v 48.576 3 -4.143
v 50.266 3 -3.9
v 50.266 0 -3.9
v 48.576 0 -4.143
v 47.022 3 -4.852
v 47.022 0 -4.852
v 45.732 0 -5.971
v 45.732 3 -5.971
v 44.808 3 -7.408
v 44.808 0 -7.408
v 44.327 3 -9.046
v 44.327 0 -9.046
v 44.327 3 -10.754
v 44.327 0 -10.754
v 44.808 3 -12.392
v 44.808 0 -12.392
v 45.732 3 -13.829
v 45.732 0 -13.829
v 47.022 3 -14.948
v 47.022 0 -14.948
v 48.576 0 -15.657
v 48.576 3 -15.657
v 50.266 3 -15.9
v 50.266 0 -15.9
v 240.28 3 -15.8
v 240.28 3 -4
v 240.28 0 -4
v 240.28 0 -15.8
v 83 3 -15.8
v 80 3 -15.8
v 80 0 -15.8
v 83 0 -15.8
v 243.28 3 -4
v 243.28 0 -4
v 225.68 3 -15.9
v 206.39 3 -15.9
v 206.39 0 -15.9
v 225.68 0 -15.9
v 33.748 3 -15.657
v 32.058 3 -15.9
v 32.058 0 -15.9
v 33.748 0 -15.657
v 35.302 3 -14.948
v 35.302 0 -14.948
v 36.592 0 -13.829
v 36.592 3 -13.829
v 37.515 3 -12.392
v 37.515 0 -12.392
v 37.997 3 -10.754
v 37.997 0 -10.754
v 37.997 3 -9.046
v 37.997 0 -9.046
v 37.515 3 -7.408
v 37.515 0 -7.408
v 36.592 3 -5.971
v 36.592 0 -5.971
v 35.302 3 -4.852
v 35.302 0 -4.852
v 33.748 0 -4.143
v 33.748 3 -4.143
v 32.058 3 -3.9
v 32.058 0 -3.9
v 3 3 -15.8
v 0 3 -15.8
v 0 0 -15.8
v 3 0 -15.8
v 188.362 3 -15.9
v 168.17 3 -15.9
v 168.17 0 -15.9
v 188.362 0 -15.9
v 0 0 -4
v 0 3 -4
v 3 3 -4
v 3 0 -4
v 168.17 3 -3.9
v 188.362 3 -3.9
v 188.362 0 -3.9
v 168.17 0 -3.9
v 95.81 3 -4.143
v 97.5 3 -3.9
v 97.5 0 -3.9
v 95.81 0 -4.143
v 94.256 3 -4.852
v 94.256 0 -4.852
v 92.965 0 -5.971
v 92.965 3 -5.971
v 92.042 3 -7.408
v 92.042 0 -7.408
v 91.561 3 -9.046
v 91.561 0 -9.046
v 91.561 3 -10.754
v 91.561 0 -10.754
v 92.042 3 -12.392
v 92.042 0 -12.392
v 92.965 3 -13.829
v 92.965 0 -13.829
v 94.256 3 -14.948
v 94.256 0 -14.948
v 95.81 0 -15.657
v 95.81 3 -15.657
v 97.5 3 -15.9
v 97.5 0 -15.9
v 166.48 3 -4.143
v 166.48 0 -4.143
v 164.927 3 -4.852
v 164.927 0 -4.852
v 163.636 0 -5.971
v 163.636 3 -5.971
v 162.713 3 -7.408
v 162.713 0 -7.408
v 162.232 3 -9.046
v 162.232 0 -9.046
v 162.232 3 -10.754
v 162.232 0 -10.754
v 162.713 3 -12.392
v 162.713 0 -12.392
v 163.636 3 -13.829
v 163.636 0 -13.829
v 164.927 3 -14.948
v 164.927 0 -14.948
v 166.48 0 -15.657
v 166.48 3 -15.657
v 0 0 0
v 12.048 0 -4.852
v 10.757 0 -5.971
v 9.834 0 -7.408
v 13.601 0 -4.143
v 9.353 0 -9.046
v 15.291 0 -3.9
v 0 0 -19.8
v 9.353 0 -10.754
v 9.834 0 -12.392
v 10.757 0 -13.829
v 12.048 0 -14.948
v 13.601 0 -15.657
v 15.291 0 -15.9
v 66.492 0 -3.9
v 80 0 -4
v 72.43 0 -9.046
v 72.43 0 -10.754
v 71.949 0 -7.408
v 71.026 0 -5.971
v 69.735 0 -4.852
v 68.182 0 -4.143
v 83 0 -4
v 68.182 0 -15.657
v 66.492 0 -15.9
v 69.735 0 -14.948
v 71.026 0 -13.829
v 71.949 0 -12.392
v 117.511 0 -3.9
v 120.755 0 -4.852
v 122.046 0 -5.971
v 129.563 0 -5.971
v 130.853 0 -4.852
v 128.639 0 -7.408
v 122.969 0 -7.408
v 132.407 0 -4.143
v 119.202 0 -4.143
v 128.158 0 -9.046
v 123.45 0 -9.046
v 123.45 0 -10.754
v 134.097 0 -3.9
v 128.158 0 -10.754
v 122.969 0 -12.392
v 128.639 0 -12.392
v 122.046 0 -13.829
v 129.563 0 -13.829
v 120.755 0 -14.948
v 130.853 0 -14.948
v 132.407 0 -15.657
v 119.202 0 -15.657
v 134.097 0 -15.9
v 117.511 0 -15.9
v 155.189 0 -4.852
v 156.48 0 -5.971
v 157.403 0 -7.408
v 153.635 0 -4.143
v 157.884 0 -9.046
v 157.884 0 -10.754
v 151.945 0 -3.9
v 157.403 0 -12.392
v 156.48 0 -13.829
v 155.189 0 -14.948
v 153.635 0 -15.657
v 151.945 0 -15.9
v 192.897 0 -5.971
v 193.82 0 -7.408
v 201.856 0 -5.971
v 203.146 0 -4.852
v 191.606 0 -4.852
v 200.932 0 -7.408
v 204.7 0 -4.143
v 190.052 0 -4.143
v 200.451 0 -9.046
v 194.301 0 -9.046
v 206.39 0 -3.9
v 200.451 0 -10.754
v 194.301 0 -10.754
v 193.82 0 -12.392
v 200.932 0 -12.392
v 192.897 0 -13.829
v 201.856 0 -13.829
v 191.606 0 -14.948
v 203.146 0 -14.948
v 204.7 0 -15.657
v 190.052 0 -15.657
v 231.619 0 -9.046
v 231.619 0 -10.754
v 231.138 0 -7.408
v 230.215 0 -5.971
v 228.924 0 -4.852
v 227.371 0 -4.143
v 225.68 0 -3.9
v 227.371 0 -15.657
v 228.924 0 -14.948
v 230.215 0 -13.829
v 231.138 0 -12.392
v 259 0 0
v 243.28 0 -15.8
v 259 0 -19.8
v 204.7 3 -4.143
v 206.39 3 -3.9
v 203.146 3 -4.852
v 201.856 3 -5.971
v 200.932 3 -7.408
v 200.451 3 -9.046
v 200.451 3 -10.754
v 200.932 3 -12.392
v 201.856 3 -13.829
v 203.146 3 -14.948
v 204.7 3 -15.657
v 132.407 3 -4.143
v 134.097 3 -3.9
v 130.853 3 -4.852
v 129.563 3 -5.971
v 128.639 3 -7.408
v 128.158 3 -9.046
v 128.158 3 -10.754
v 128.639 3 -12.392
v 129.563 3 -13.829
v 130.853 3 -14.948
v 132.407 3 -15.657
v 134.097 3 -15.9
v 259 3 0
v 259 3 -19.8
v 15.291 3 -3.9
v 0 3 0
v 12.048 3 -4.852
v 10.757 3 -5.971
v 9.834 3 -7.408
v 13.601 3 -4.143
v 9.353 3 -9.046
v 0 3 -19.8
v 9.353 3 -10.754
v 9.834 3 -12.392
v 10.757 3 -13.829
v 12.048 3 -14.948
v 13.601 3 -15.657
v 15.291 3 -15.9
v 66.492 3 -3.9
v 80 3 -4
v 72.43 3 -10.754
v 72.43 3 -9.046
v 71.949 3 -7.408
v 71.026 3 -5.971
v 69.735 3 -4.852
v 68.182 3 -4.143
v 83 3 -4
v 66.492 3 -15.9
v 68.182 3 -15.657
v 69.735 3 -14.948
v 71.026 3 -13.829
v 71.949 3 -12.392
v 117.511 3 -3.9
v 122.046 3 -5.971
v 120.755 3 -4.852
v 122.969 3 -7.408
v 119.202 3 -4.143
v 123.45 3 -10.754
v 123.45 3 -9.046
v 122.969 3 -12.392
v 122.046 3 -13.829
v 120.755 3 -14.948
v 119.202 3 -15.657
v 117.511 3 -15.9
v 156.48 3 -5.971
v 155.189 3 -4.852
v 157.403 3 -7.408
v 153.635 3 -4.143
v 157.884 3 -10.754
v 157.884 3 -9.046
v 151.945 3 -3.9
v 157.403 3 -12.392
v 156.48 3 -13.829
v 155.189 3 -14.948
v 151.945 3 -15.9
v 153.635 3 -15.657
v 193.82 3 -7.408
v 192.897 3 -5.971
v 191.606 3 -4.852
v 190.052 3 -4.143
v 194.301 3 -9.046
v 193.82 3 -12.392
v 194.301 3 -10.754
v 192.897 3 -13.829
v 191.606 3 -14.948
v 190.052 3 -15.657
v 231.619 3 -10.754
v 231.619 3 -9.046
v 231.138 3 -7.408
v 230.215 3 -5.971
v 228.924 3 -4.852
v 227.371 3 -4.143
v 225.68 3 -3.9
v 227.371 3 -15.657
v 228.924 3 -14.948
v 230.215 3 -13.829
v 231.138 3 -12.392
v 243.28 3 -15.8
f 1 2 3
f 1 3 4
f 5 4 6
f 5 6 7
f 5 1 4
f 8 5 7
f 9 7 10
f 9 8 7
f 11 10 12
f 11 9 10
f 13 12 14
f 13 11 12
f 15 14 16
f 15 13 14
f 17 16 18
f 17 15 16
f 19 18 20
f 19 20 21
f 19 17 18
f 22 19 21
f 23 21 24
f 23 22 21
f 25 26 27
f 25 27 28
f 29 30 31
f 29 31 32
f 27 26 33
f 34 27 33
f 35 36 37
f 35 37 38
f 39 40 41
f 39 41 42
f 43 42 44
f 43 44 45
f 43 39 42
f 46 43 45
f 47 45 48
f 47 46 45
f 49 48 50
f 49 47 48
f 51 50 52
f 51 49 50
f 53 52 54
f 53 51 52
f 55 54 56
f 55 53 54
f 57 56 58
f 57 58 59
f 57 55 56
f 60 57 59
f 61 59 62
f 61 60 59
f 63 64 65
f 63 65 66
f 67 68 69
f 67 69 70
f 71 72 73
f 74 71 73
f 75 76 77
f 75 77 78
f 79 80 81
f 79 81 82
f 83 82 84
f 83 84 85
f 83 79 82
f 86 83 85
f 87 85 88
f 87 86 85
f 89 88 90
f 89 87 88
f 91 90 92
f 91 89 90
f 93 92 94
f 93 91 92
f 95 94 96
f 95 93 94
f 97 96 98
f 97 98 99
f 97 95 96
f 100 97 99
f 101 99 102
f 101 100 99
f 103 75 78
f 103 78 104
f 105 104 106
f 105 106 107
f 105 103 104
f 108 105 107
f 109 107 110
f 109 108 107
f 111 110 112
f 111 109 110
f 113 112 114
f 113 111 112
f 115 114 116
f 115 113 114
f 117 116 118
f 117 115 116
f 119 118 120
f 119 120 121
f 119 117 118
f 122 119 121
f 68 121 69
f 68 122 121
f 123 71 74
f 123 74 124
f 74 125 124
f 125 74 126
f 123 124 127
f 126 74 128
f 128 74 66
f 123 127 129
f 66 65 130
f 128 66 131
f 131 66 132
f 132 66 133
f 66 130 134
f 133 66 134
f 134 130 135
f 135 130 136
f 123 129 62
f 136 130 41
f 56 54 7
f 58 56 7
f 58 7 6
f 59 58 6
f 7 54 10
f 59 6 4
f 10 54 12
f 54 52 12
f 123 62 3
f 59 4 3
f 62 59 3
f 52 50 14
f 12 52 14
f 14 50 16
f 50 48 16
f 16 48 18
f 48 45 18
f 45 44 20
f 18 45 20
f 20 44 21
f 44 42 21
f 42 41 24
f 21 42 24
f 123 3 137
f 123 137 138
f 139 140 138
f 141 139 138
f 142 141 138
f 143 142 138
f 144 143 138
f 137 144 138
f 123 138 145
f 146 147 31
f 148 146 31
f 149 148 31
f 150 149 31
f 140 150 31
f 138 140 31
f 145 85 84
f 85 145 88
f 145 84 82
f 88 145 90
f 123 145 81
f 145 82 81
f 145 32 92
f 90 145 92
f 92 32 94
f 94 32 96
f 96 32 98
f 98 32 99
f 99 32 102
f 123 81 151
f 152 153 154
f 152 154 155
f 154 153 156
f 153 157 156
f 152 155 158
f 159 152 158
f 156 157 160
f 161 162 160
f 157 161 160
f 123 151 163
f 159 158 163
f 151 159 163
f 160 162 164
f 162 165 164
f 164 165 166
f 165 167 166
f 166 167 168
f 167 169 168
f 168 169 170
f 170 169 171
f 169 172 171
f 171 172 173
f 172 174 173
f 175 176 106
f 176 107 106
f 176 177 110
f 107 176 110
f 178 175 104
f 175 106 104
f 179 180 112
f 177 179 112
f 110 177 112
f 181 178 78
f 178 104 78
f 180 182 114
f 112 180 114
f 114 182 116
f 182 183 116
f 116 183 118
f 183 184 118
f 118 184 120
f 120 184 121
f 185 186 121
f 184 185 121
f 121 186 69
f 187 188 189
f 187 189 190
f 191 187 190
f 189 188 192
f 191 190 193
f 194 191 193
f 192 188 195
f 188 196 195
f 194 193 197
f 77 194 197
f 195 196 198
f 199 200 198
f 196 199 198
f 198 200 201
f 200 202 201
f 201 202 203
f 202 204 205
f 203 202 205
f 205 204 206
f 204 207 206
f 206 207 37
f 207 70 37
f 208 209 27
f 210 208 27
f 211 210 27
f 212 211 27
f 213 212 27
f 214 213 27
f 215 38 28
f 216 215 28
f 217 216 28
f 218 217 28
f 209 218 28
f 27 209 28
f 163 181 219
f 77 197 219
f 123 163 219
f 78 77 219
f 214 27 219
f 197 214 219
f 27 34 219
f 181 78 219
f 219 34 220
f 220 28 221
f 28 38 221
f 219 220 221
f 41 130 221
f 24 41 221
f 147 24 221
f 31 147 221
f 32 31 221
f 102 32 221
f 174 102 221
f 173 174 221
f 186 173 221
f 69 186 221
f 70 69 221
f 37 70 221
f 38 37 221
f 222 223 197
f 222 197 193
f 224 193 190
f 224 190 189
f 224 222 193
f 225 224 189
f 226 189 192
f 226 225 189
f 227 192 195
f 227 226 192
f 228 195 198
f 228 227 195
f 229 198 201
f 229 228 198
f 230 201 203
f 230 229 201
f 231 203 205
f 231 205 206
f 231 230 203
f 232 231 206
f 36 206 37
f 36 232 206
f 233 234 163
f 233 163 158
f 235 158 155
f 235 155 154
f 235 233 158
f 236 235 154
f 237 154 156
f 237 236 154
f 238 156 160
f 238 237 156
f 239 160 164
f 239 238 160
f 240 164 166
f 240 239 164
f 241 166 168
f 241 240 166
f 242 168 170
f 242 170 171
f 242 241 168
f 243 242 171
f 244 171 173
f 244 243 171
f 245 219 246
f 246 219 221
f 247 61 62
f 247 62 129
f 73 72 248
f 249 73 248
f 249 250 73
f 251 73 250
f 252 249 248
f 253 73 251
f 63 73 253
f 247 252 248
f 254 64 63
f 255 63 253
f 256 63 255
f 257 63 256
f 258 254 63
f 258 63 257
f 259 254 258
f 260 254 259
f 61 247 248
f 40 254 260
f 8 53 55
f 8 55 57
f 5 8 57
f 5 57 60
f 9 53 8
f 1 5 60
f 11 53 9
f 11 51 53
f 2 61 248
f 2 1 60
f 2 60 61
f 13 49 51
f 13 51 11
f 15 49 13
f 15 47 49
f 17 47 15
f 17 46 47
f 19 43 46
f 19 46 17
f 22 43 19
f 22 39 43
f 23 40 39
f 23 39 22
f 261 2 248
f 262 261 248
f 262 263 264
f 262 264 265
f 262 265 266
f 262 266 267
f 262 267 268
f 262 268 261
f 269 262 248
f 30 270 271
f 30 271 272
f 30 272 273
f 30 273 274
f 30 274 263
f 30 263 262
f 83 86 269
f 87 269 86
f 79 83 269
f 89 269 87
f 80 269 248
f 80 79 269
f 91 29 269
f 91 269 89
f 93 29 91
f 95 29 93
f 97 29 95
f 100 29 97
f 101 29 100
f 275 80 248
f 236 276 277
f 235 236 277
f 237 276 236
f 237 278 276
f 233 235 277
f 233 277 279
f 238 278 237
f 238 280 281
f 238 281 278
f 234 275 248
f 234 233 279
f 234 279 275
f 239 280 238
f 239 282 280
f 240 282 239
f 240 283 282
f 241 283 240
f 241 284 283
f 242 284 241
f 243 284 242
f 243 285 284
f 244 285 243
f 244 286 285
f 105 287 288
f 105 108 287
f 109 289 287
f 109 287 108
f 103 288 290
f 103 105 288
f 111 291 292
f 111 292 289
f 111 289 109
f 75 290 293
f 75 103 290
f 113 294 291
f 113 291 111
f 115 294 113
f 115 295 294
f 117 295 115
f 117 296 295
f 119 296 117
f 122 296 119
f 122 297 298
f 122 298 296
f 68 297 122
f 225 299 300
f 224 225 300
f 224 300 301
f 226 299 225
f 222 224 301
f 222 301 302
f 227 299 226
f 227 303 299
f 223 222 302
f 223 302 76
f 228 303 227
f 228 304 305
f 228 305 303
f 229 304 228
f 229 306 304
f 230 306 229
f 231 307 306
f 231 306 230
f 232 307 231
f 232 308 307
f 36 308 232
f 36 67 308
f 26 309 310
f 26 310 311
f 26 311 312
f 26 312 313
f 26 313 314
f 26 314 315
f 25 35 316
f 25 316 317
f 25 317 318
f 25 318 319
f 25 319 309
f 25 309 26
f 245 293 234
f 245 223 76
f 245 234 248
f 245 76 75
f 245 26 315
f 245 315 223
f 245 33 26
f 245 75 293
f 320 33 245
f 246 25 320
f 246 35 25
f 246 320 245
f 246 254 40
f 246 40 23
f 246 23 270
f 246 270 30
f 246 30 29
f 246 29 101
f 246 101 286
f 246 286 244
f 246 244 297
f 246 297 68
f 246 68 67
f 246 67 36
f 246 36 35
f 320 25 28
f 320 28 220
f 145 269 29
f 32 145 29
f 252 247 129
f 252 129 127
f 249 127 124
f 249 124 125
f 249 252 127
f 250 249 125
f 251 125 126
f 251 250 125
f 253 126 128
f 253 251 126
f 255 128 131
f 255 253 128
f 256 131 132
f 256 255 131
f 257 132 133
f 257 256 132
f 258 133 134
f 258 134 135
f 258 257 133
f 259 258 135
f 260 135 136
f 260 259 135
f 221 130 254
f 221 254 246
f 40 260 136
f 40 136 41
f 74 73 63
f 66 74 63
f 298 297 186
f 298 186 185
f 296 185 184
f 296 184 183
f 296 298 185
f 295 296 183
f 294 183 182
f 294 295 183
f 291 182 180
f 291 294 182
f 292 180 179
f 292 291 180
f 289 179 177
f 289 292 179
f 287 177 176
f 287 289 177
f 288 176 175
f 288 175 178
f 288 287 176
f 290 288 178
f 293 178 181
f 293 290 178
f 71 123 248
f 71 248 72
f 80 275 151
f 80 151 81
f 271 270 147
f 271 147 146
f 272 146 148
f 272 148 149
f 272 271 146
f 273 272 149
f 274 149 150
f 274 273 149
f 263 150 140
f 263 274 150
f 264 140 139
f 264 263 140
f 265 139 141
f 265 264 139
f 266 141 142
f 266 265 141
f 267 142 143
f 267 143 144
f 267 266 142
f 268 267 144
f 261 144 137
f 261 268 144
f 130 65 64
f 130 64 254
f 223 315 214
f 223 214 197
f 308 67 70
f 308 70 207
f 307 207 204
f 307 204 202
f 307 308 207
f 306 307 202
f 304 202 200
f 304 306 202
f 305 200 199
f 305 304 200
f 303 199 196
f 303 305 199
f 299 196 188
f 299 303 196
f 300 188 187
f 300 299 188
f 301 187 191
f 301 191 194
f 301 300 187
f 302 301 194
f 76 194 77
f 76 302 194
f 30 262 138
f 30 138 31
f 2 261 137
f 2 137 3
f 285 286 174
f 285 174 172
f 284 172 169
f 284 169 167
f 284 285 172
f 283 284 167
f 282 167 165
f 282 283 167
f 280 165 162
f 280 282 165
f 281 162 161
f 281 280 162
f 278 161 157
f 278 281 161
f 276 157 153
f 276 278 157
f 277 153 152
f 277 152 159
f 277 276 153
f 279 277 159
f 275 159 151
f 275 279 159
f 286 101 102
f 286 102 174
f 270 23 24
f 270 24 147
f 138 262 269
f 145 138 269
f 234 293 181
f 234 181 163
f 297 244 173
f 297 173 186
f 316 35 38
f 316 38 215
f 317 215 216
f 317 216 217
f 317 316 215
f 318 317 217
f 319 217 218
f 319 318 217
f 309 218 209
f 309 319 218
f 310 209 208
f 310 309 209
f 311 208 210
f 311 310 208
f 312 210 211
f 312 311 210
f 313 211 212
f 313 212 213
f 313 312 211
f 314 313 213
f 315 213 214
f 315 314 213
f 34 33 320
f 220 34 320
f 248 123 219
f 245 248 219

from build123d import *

# Parameters (mm, degrees)
SKETCH1_W           = 259
SKETCH1_H           = 19.8
BOSS_EXTRUDE1_DEPTH = 3
SKETCH2_W           = 3
SKETCH2_H           = 11.8
CUT_EXTRUDE1_DEPTH  = 3
CUT_EXTRUDE2_DEPTH  = 3


with BuildPart() as part:
    # Sketch1 → Boss-Extrude1 (new body)
    with BuildSketch(Plane(origin=(0, 0, 0), x_dir=(1, 0, 0), z_dir=(0, 1, 0))):
        with Locations((129.5, 9.9)):
            Rectangle(SKETCH1_W, SKETCH1_H)
    extrude(amount=BOSS_EXTRUDE1_DEPTH)

    # Sketch2 → Cut-Extrude1 (cut)
    with BuildSketch(Plane(origin=(0, 3, 0), x_dir=(1, 0, 0), z_dir=(0, 1, 0))):
        with Locations((1.5, 9.9)):
            Rectangle(SKETCH2_W, SKETCH2_H)
        with Locations((81.5, 9.9)):
            Rectangle(SKETCH2_W, SKETCH2_H)
        with Locations((241.78, 9.9)):
            Rectangle(SKETCH2_W, SKETCH2_H)
    extrude(amount=-CUT_EXTRUDE1_DEPTH, mode=Mode.SUBTRACT)

    # Sketch3 → Cut-Extrude2 (cut)
    with BuildSketch(Plane(origin=(0, 3, 0), x_dir=(1, 0, 0), z_dir=(0, 1, 0))):
        with BuildLine():
            Line((15.291475512, 15.9), (32.057683526, 15.9))
            ThreePointArc((32.057683526, 15.9), (38.057683526, 9.9), (32.057683526, 3.9))
            Line((32.057683526, 3.9), (15.291475512, 3.9))
            ThreePointArc((15.291475512, 3.9), (9.291475512, 9.9), (15.291475512, 15.9))
        make_face()
        with BuildLine():
            Line((97.499979326, 15.9), (117.51125986, 15.9))
            ThreePointArc((117.51125986, 15.9), (123.51125986, 9.9), (117.51125986, 3.9))
            Line((117.51125986, 3.9), (97.499979326, 3.9))
            ThreePointArc((97.499979326, 3.9), (91.499979326, 9.9), (97.499979326, 15.9))
        make_face()
        with BuildLine():
            Line((134.097186069, 15.9), (151.945084923, 15.9))
            ThreePointArc((151.945084923, 15.9), (157.945084923, 9.9), (151.945084923, 3.9))
            Line((151.945084923, 3.9), (134.097186069, 3.9))
            ThreePointArc((134.097186069, 3.9), (128.097186069, 9.9), (134.097186069, 15.9))
        make_face()
        with BuildLine():
            Line((50.266145994, 15.9), (66.491508589, 15.9))
            ThreePointArc((66.491508589, 15.9), (72.491508589, 9.9), (66.491508589, 3.9))
            Line((66.491508589, 3.9), (50.266145994, 3.9))
            ThreePointArc((50.266145994, 3.9), (44.266145994, 9.9), (50.266145994, 15.9))
        make_face()
        with BuildLine():
            Line((168.170447518, 15.9), (188.362009859, 15.9))
            ThreePointArc((188.362009859, 15.9), (194.362009859, 9.9), (188.362009859, 3.9))
            Line((188.362009859, 3.9), (168.170447518, 3.9))
            ThreePointArc((168.170447518, 3.9), (162.170447518, 9.9), (168.170447518, 15.9))
        make_face()
        with BuildLine():
            Line((206.39019052, 15.9), (225.680343827, 15.9))
            ThreePointArc((225.680343827, 15.9), (231.680343827, 9.9), (225.680343827, 3.9))
            Line((225.680343827, 3.9), (206.39019052, 3.9))
            ThreePointArc((206.39019052, 3.9), (200.39019052, 9.9), (206.39019052, 15.9))
        make_face()
    extrude(amount=-CUT_EXTRUDE2_DEPTH, mode=Mode.SUBTRACT)


solid = part.part
